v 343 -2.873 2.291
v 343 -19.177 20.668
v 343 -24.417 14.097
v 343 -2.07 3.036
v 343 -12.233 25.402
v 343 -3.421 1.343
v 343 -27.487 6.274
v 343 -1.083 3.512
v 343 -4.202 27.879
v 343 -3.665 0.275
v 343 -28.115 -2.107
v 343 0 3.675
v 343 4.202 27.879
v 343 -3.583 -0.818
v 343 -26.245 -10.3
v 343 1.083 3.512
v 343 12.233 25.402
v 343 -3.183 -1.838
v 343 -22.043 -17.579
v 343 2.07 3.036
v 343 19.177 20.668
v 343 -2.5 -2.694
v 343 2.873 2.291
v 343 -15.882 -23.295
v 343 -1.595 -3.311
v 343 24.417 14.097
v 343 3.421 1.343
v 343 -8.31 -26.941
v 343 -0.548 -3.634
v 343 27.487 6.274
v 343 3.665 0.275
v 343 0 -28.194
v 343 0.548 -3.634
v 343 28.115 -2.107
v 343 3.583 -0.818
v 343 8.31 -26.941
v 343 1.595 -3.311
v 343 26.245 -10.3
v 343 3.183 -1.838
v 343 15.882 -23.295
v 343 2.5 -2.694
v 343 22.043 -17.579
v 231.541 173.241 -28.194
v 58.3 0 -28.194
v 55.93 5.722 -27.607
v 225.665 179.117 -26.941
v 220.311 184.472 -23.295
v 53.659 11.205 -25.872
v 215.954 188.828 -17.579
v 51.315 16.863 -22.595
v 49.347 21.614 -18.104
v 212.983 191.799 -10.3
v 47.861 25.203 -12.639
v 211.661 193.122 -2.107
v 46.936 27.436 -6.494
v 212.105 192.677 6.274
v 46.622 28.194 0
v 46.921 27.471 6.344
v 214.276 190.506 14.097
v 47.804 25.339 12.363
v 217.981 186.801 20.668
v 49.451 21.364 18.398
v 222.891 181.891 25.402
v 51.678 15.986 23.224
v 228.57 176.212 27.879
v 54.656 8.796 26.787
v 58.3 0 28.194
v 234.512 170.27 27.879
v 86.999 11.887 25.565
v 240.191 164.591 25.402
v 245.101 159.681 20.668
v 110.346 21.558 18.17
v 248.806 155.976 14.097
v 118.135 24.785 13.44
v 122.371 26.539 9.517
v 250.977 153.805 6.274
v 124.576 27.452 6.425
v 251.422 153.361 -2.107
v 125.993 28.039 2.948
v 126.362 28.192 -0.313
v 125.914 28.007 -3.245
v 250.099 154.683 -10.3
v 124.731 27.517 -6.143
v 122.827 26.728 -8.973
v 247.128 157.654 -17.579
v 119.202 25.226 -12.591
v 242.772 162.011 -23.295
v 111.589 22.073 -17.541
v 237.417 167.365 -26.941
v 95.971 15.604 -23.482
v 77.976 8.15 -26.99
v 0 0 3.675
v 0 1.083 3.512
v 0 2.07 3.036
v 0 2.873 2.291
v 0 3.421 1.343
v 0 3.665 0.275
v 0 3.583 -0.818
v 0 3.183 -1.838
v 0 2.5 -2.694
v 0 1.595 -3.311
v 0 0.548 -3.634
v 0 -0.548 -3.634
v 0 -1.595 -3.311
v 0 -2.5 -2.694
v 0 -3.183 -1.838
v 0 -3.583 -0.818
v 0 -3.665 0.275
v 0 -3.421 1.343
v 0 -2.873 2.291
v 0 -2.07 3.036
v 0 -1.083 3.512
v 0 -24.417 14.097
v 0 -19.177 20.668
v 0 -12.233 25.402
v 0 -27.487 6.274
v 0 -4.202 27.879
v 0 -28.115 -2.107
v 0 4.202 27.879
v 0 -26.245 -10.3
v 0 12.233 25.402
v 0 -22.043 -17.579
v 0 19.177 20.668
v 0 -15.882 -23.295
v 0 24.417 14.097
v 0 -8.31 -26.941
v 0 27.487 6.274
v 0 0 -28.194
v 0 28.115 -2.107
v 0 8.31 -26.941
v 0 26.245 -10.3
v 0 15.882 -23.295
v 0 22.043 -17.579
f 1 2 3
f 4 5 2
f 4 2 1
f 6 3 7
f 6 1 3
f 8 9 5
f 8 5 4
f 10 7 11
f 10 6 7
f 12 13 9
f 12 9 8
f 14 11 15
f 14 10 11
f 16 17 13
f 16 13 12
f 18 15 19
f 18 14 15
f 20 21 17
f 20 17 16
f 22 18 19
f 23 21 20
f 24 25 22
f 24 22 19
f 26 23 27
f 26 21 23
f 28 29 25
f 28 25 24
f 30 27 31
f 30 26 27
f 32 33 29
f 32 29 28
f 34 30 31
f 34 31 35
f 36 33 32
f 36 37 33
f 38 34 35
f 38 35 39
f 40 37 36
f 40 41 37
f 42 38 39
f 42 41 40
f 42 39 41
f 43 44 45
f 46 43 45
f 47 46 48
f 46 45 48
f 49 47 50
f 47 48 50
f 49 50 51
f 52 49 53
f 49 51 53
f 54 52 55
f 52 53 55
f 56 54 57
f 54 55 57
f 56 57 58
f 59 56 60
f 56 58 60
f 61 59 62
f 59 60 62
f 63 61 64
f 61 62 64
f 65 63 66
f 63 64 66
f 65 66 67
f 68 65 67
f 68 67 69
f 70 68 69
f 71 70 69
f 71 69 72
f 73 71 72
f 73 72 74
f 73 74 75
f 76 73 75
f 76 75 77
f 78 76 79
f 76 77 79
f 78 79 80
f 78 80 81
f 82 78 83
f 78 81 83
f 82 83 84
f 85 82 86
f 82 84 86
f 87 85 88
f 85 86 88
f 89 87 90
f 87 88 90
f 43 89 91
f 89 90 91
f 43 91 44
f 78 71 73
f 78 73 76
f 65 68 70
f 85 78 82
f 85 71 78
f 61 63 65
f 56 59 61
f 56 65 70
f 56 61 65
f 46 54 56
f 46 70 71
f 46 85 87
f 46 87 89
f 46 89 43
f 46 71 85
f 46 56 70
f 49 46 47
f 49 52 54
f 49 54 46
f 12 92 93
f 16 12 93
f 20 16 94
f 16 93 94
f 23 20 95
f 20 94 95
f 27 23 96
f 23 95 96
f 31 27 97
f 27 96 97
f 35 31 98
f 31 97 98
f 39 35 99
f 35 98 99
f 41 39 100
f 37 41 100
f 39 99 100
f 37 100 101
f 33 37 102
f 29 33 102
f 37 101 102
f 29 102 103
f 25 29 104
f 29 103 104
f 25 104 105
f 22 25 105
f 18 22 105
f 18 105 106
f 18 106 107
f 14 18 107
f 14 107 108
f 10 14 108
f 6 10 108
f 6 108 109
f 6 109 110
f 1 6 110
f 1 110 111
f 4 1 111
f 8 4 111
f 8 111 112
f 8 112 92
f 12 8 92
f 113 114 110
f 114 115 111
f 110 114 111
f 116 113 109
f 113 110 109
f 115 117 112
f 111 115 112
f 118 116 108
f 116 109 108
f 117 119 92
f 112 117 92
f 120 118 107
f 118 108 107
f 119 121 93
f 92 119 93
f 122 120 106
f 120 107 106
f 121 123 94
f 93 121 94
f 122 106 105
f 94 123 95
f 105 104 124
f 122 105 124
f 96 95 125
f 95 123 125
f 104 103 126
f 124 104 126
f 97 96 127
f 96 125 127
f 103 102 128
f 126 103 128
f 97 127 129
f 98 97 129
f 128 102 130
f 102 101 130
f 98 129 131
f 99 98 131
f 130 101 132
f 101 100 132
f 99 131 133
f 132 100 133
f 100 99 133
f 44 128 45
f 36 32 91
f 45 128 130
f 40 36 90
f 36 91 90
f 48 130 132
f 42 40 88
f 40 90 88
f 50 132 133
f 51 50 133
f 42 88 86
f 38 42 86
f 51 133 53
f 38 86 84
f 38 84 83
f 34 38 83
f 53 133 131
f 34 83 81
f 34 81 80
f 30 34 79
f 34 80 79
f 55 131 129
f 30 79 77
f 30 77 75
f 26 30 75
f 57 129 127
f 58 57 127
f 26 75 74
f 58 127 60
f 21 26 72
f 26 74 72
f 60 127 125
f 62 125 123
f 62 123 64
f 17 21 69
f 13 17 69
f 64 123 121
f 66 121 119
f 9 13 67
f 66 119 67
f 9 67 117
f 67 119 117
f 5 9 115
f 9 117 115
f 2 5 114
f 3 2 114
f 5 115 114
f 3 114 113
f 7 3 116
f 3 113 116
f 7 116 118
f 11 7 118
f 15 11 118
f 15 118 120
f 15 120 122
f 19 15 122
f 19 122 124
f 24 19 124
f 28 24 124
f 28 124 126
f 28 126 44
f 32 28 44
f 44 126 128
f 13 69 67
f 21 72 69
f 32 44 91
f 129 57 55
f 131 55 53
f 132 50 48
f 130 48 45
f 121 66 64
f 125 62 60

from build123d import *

# Parameters (mm, degrees)
SKETCH1_R           = 28.194
BOSS_EXTRUDE1_DEPTH = 343
SKETCH5_R           = 28.194
BOSS_EXTRUDE3_DEPTH = 245
SKETCH7_R           = 3.675
CUT_EXTRUDE1_DEPTH  = 369.4


with BuildPart() as part:
    # Sketch1 → Boss-Extrude1 (new body)
    with BuildSketch(Plane(origin=(0, 0, 0), x_dir=(0, 0, -1), z_dir=(1, 0, 0))):
        Circle(SKETCH1_R)
    extrude(amount=BOSS_EXTRUDE1_DEPTH)

    # Sketch5 → Boss-Extrude3 (add)
    with BuildSketch(Plane(origin=(29.15, 29.15, 0), x_dir=(0.7071067811865464, -0.7071067811865488, 0), z_dir=(0.7071067811865488, 0.7071067811865464, 0))):
        with Locations(Location((41.224325343, 0, 0), (0, 0, 90))):
            Circle(SKETCH5_R)
    extrude(amount=BOSS_EXTRUDE3_DEPTH)

    # Sketch7 → Cut-Extrude1 (cut)
    with BuildSketch(Plane.ZY):
        Circle(SKETCH7_R)
    extrude(amount=-CUT_EXTRUDE1_DEPTH, mode=Mode.SUBTRACT)


solid = part.part
